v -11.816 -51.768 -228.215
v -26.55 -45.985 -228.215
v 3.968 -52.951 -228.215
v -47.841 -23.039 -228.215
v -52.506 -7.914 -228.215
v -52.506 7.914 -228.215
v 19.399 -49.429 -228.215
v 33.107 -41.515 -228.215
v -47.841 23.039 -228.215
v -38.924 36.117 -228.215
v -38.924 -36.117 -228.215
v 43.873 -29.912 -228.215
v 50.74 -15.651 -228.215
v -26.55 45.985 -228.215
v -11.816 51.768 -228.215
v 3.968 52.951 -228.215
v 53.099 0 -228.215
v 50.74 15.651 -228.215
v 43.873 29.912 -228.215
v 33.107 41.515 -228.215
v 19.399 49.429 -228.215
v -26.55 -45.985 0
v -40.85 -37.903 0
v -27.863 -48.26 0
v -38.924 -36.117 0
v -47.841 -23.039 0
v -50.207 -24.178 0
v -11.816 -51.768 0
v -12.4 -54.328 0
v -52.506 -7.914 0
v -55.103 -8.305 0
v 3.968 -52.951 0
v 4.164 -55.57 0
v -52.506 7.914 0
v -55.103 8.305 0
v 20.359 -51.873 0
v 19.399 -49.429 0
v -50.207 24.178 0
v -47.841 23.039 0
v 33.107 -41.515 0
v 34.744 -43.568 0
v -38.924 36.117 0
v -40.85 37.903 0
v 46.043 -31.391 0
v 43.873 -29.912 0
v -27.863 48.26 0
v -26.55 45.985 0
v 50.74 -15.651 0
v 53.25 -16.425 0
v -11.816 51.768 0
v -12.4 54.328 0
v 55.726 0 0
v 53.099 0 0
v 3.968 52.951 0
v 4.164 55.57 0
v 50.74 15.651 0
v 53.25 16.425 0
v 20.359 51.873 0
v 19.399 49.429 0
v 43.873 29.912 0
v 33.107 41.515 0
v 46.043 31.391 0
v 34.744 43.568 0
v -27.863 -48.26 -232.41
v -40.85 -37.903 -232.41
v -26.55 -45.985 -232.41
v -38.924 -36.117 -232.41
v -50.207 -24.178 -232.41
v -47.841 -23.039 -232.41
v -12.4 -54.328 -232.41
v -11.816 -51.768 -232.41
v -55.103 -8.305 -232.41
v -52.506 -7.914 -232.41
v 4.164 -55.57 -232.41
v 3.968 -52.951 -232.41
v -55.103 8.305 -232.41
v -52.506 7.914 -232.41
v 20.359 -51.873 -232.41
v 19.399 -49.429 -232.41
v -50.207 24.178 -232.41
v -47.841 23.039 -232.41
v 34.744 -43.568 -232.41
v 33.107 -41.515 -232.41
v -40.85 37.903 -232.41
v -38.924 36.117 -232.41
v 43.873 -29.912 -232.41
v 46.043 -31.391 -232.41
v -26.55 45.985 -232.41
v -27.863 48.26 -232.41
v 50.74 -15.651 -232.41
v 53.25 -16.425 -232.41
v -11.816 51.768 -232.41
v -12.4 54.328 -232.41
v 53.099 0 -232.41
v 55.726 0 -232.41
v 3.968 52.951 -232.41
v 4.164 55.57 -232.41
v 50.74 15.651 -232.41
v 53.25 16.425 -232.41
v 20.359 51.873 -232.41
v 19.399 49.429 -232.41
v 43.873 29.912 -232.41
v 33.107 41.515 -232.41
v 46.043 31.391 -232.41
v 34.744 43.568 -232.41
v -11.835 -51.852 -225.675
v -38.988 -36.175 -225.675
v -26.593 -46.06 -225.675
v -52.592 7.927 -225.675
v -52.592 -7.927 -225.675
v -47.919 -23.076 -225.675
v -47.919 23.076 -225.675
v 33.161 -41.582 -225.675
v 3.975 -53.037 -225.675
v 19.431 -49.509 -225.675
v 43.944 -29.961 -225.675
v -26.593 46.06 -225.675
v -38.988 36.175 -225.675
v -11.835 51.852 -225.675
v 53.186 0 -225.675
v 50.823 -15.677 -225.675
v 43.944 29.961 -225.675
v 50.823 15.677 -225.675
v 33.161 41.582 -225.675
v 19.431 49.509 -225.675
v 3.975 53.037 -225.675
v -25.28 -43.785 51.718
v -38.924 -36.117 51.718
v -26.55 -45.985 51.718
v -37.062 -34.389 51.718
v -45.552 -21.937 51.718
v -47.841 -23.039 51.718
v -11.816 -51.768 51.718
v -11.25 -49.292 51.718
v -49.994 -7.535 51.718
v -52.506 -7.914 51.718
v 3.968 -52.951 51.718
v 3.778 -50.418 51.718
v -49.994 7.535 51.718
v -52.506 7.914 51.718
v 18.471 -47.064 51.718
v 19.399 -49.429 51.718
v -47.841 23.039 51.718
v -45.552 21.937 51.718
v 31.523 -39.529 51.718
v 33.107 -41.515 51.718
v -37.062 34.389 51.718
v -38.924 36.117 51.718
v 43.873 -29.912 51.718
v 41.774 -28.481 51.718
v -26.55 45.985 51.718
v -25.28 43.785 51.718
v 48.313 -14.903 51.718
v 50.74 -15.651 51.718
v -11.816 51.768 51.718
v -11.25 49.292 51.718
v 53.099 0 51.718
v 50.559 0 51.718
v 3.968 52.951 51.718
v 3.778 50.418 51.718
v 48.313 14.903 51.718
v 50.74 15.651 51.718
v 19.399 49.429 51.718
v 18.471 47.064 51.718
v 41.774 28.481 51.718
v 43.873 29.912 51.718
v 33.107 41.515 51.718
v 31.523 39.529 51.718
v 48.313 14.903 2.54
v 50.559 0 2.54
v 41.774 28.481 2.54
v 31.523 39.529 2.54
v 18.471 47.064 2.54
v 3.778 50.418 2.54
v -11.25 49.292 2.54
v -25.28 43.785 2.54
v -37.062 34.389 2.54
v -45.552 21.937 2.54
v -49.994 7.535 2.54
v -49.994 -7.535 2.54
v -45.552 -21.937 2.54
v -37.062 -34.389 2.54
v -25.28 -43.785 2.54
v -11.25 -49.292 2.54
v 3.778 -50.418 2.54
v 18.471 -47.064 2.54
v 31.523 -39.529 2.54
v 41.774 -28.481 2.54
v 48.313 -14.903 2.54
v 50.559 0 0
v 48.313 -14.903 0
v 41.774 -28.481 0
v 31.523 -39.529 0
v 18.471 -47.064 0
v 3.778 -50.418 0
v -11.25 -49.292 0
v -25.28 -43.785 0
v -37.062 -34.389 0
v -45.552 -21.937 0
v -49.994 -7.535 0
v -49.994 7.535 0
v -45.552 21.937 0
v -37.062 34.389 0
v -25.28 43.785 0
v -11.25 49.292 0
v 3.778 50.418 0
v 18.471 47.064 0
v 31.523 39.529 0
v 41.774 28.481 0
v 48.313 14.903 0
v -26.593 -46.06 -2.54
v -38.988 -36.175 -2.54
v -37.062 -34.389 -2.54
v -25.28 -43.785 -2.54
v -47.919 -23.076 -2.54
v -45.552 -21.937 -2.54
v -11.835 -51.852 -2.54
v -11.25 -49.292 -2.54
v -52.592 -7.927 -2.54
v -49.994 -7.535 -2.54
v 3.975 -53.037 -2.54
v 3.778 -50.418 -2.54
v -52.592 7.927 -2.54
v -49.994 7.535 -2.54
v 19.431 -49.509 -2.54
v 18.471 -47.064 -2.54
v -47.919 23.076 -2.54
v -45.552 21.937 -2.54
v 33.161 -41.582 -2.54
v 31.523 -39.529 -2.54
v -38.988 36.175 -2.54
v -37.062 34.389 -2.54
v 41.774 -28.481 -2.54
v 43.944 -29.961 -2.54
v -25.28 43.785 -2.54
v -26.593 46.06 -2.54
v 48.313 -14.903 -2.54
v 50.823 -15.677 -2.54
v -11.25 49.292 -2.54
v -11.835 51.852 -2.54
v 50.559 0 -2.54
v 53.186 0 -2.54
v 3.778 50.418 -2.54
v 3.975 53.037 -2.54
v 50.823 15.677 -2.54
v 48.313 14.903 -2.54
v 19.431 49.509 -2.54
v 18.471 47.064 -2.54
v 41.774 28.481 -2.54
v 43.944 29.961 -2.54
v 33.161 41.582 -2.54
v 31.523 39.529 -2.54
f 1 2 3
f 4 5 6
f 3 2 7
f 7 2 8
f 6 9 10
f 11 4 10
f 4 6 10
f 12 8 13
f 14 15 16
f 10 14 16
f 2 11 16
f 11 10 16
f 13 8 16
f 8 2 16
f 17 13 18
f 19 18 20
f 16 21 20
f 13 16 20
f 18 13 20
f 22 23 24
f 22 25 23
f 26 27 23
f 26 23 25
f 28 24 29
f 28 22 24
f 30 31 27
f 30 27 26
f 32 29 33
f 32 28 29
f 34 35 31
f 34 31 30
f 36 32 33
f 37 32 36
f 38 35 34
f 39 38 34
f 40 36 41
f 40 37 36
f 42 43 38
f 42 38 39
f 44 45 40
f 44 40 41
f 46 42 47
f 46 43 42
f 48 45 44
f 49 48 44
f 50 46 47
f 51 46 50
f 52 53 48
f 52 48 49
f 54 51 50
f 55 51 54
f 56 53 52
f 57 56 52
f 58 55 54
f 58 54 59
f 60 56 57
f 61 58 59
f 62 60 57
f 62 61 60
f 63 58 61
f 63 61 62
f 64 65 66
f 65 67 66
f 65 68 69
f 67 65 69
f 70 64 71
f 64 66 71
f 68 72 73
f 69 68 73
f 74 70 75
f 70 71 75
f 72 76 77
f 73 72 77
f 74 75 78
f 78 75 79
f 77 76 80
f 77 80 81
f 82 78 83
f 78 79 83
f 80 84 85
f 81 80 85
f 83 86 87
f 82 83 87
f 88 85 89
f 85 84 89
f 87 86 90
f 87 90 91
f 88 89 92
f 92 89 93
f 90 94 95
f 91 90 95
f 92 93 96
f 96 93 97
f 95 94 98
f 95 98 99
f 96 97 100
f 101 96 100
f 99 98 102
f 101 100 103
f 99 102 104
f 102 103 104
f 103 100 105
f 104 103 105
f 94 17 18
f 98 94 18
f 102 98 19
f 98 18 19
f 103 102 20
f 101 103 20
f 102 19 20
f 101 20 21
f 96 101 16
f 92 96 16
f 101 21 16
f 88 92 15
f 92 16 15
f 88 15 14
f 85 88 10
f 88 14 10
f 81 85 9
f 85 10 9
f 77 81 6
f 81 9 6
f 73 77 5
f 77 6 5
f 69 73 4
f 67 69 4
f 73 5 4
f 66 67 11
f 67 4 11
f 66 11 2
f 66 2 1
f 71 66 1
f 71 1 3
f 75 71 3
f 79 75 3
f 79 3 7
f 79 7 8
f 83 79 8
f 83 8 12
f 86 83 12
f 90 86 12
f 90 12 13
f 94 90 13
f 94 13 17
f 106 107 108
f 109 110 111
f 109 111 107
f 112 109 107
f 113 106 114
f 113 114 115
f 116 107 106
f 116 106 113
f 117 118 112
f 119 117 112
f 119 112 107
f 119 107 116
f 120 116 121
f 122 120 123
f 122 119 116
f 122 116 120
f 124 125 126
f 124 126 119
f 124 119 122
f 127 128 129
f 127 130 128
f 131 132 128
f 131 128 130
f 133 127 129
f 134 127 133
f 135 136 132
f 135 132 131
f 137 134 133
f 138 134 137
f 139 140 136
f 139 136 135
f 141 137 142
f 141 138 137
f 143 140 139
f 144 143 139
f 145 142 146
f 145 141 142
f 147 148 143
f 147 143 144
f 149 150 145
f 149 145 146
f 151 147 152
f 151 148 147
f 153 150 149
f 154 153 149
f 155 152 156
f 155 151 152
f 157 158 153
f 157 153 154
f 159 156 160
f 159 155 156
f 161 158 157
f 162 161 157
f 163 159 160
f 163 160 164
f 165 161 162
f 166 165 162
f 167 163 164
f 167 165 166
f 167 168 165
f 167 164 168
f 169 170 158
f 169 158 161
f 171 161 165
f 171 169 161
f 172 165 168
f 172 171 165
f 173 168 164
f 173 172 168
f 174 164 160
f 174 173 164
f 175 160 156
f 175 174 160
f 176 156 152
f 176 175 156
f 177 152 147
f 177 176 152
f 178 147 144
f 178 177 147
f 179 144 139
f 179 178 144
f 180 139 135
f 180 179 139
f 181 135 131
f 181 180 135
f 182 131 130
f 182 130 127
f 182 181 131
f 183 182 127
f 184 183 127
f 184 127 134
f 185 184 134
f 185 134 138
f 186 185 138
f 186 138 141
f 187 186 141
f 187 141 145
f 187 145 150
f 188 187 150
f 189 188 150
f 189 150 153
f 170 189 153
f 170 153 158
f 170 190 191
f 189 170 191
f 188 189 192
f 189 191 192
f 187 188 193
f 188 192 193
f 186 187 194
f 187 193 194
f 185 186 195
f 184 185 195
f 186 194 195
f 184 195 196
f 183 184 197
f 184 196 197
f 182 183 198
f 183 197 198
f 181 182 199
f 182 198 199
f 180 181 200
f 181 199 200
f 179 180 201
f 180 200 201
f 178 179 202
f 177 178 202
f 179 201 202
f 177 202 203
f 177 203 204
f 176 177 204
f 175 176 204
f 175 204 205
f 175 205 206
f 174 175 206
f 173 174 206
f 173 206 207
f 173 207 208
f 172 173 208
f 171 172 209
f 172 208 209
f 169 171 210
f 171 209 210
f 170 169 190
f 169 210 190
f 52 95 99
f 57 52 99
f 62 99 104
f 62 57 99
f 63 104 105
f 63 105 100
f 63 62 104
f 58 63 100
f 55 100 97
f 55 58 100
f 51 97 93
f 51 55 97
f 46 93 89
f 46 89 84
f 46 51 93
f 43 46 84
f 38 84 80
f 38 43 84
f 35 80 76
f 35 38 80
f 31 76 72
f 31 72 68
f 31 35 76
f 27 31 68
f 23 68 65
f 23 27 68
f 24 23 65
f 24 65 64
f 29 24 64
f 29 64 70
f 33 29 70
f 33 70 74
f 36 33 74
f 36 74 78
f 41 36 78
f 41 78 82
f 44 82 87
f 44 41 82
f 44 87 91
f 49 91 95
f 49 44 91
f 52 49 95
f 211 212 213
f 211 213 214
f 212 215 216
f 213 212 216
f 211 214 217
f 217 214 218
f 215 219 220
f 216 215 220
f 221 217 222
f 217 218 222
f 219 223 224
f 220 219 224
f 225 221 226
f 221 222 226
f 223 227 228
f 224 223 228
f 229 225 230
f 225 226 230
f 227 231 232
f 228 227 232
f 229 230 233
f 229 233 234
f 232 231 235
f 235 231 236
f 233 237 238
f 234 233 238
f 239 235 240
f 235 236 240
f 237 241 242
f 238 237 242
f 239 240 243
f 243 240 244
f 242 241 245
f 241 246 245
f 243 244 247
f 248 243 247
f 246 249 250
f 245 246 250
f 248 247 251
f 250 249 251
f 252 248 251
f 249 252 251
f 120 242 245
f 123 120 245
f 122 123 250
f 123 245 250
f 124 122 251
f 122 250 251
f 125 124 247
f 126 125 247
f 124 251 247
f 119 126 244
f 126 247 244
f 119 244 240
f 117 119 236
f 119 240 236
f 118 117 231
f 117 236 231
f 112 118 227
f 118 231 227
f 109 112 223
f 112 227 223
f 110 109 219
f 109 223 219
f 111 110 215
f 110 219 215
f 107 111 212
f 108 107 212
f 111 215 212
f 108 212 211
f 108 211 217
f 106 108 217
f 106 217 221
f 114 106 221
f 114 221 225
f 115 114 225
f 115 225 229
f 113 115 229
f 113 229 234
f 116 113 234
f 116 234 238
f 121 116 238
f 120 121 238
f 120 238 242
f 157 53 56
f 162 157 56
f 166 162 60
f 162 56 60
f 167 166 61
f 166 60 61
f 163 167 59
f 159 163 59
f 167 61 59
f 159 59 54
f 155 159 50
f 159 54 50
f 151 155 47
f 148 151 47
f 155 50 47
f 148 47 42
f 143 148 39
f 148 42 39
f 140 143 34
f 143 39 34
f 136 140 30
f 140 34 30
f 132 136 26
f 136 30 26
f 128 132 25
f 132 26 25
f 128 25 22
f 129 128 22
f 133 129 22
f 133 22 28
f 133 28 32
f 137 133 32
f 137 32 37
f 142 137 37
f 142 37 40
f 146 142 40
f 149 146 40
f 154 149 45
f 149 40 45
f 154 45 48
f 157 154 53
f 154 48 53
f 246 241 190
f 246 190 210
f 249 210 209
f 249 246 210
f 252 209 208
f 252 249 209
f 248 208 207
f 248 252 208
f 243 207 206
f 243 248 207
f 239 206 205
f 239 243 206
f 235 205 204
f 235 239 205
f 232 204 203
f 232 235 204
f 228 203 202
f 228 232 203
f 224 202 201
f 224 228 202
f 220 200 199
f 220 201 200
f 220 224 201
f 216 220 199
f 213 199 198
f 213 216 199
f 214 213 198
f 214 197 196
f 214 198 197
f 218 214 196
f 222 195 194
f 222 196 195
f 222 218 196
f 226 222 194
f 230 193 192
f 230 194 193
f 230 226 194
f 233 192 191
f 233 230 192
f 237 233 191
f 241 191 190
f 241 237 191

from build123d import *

# Parameters (mm, degrees)
F0_R     = 53.0991394176
F1_DEPTH = 51.71754
F0_R_2   = 55.7255834594
F2_DEPTH = 232.41034
F3_T     = -2.54
F4_DEPTH = 228.21454
F5_T     = -2.54


# Not quite as in the source:
# - a shell that OpenCascade refuses in one call is made with other operations: the cavity is built on its own and cut out


with BuildPart() as f1:
    # F0 (on Top) → F1 (new body)
    with BuildSketch(Plane.XY):
        Circle(F0_R)
    extrude(amount=F1_DEPTH)

    # F3
    f3_openings = [f1.faces().sort_by_distance(p)[0] for p in [
        (0, 0, 51.71754),
    ]]
    offset(amount=F3_T, openings=f3_openings)

    # F4 (add): a face of the model
    f4_faces = [f1.faces().sort_by_distance(p)[0] for p in [
        (0, 0, 0),
    ]]


with BuildPart() as f2:
    # F0 (on Top) → F2 (new body)
    with BuildSketch(Plane.XY):
        Circle(F0_R_2)
        Circle(F0_R, mode=Mode.SUBTRACT)
    extrude(amount=-F2_DEPTH)


with BuildPart() as f1_1:
    add(f1.part)

    add(f2.part)  # F4 merges F2
    extrude(f4_faces, amount=F4_DEPTH)

    # F5: a shell. OpenCascade refuses it in one call, so the cavity is built on its own and cut out:
    # the body offset inwards by the wall thickness, plus a prism from it out through each open face.
    f5_core = offset(f1_1.part, amount=F5_T, kind=Kind.INTERSECTION, mode=Mode.PRIVATE)
    f5_exits = [f5_core.faces().sort_by_distance(p)[0] for p in [
        (0, 0, 0),
    ]]
    add(f5_core, mode=Mode.SUBTRACT)
    extrude(f5_exits, amount=-F5_T, mode=Mode.SUBTRACT)


solid = f1_1.part
